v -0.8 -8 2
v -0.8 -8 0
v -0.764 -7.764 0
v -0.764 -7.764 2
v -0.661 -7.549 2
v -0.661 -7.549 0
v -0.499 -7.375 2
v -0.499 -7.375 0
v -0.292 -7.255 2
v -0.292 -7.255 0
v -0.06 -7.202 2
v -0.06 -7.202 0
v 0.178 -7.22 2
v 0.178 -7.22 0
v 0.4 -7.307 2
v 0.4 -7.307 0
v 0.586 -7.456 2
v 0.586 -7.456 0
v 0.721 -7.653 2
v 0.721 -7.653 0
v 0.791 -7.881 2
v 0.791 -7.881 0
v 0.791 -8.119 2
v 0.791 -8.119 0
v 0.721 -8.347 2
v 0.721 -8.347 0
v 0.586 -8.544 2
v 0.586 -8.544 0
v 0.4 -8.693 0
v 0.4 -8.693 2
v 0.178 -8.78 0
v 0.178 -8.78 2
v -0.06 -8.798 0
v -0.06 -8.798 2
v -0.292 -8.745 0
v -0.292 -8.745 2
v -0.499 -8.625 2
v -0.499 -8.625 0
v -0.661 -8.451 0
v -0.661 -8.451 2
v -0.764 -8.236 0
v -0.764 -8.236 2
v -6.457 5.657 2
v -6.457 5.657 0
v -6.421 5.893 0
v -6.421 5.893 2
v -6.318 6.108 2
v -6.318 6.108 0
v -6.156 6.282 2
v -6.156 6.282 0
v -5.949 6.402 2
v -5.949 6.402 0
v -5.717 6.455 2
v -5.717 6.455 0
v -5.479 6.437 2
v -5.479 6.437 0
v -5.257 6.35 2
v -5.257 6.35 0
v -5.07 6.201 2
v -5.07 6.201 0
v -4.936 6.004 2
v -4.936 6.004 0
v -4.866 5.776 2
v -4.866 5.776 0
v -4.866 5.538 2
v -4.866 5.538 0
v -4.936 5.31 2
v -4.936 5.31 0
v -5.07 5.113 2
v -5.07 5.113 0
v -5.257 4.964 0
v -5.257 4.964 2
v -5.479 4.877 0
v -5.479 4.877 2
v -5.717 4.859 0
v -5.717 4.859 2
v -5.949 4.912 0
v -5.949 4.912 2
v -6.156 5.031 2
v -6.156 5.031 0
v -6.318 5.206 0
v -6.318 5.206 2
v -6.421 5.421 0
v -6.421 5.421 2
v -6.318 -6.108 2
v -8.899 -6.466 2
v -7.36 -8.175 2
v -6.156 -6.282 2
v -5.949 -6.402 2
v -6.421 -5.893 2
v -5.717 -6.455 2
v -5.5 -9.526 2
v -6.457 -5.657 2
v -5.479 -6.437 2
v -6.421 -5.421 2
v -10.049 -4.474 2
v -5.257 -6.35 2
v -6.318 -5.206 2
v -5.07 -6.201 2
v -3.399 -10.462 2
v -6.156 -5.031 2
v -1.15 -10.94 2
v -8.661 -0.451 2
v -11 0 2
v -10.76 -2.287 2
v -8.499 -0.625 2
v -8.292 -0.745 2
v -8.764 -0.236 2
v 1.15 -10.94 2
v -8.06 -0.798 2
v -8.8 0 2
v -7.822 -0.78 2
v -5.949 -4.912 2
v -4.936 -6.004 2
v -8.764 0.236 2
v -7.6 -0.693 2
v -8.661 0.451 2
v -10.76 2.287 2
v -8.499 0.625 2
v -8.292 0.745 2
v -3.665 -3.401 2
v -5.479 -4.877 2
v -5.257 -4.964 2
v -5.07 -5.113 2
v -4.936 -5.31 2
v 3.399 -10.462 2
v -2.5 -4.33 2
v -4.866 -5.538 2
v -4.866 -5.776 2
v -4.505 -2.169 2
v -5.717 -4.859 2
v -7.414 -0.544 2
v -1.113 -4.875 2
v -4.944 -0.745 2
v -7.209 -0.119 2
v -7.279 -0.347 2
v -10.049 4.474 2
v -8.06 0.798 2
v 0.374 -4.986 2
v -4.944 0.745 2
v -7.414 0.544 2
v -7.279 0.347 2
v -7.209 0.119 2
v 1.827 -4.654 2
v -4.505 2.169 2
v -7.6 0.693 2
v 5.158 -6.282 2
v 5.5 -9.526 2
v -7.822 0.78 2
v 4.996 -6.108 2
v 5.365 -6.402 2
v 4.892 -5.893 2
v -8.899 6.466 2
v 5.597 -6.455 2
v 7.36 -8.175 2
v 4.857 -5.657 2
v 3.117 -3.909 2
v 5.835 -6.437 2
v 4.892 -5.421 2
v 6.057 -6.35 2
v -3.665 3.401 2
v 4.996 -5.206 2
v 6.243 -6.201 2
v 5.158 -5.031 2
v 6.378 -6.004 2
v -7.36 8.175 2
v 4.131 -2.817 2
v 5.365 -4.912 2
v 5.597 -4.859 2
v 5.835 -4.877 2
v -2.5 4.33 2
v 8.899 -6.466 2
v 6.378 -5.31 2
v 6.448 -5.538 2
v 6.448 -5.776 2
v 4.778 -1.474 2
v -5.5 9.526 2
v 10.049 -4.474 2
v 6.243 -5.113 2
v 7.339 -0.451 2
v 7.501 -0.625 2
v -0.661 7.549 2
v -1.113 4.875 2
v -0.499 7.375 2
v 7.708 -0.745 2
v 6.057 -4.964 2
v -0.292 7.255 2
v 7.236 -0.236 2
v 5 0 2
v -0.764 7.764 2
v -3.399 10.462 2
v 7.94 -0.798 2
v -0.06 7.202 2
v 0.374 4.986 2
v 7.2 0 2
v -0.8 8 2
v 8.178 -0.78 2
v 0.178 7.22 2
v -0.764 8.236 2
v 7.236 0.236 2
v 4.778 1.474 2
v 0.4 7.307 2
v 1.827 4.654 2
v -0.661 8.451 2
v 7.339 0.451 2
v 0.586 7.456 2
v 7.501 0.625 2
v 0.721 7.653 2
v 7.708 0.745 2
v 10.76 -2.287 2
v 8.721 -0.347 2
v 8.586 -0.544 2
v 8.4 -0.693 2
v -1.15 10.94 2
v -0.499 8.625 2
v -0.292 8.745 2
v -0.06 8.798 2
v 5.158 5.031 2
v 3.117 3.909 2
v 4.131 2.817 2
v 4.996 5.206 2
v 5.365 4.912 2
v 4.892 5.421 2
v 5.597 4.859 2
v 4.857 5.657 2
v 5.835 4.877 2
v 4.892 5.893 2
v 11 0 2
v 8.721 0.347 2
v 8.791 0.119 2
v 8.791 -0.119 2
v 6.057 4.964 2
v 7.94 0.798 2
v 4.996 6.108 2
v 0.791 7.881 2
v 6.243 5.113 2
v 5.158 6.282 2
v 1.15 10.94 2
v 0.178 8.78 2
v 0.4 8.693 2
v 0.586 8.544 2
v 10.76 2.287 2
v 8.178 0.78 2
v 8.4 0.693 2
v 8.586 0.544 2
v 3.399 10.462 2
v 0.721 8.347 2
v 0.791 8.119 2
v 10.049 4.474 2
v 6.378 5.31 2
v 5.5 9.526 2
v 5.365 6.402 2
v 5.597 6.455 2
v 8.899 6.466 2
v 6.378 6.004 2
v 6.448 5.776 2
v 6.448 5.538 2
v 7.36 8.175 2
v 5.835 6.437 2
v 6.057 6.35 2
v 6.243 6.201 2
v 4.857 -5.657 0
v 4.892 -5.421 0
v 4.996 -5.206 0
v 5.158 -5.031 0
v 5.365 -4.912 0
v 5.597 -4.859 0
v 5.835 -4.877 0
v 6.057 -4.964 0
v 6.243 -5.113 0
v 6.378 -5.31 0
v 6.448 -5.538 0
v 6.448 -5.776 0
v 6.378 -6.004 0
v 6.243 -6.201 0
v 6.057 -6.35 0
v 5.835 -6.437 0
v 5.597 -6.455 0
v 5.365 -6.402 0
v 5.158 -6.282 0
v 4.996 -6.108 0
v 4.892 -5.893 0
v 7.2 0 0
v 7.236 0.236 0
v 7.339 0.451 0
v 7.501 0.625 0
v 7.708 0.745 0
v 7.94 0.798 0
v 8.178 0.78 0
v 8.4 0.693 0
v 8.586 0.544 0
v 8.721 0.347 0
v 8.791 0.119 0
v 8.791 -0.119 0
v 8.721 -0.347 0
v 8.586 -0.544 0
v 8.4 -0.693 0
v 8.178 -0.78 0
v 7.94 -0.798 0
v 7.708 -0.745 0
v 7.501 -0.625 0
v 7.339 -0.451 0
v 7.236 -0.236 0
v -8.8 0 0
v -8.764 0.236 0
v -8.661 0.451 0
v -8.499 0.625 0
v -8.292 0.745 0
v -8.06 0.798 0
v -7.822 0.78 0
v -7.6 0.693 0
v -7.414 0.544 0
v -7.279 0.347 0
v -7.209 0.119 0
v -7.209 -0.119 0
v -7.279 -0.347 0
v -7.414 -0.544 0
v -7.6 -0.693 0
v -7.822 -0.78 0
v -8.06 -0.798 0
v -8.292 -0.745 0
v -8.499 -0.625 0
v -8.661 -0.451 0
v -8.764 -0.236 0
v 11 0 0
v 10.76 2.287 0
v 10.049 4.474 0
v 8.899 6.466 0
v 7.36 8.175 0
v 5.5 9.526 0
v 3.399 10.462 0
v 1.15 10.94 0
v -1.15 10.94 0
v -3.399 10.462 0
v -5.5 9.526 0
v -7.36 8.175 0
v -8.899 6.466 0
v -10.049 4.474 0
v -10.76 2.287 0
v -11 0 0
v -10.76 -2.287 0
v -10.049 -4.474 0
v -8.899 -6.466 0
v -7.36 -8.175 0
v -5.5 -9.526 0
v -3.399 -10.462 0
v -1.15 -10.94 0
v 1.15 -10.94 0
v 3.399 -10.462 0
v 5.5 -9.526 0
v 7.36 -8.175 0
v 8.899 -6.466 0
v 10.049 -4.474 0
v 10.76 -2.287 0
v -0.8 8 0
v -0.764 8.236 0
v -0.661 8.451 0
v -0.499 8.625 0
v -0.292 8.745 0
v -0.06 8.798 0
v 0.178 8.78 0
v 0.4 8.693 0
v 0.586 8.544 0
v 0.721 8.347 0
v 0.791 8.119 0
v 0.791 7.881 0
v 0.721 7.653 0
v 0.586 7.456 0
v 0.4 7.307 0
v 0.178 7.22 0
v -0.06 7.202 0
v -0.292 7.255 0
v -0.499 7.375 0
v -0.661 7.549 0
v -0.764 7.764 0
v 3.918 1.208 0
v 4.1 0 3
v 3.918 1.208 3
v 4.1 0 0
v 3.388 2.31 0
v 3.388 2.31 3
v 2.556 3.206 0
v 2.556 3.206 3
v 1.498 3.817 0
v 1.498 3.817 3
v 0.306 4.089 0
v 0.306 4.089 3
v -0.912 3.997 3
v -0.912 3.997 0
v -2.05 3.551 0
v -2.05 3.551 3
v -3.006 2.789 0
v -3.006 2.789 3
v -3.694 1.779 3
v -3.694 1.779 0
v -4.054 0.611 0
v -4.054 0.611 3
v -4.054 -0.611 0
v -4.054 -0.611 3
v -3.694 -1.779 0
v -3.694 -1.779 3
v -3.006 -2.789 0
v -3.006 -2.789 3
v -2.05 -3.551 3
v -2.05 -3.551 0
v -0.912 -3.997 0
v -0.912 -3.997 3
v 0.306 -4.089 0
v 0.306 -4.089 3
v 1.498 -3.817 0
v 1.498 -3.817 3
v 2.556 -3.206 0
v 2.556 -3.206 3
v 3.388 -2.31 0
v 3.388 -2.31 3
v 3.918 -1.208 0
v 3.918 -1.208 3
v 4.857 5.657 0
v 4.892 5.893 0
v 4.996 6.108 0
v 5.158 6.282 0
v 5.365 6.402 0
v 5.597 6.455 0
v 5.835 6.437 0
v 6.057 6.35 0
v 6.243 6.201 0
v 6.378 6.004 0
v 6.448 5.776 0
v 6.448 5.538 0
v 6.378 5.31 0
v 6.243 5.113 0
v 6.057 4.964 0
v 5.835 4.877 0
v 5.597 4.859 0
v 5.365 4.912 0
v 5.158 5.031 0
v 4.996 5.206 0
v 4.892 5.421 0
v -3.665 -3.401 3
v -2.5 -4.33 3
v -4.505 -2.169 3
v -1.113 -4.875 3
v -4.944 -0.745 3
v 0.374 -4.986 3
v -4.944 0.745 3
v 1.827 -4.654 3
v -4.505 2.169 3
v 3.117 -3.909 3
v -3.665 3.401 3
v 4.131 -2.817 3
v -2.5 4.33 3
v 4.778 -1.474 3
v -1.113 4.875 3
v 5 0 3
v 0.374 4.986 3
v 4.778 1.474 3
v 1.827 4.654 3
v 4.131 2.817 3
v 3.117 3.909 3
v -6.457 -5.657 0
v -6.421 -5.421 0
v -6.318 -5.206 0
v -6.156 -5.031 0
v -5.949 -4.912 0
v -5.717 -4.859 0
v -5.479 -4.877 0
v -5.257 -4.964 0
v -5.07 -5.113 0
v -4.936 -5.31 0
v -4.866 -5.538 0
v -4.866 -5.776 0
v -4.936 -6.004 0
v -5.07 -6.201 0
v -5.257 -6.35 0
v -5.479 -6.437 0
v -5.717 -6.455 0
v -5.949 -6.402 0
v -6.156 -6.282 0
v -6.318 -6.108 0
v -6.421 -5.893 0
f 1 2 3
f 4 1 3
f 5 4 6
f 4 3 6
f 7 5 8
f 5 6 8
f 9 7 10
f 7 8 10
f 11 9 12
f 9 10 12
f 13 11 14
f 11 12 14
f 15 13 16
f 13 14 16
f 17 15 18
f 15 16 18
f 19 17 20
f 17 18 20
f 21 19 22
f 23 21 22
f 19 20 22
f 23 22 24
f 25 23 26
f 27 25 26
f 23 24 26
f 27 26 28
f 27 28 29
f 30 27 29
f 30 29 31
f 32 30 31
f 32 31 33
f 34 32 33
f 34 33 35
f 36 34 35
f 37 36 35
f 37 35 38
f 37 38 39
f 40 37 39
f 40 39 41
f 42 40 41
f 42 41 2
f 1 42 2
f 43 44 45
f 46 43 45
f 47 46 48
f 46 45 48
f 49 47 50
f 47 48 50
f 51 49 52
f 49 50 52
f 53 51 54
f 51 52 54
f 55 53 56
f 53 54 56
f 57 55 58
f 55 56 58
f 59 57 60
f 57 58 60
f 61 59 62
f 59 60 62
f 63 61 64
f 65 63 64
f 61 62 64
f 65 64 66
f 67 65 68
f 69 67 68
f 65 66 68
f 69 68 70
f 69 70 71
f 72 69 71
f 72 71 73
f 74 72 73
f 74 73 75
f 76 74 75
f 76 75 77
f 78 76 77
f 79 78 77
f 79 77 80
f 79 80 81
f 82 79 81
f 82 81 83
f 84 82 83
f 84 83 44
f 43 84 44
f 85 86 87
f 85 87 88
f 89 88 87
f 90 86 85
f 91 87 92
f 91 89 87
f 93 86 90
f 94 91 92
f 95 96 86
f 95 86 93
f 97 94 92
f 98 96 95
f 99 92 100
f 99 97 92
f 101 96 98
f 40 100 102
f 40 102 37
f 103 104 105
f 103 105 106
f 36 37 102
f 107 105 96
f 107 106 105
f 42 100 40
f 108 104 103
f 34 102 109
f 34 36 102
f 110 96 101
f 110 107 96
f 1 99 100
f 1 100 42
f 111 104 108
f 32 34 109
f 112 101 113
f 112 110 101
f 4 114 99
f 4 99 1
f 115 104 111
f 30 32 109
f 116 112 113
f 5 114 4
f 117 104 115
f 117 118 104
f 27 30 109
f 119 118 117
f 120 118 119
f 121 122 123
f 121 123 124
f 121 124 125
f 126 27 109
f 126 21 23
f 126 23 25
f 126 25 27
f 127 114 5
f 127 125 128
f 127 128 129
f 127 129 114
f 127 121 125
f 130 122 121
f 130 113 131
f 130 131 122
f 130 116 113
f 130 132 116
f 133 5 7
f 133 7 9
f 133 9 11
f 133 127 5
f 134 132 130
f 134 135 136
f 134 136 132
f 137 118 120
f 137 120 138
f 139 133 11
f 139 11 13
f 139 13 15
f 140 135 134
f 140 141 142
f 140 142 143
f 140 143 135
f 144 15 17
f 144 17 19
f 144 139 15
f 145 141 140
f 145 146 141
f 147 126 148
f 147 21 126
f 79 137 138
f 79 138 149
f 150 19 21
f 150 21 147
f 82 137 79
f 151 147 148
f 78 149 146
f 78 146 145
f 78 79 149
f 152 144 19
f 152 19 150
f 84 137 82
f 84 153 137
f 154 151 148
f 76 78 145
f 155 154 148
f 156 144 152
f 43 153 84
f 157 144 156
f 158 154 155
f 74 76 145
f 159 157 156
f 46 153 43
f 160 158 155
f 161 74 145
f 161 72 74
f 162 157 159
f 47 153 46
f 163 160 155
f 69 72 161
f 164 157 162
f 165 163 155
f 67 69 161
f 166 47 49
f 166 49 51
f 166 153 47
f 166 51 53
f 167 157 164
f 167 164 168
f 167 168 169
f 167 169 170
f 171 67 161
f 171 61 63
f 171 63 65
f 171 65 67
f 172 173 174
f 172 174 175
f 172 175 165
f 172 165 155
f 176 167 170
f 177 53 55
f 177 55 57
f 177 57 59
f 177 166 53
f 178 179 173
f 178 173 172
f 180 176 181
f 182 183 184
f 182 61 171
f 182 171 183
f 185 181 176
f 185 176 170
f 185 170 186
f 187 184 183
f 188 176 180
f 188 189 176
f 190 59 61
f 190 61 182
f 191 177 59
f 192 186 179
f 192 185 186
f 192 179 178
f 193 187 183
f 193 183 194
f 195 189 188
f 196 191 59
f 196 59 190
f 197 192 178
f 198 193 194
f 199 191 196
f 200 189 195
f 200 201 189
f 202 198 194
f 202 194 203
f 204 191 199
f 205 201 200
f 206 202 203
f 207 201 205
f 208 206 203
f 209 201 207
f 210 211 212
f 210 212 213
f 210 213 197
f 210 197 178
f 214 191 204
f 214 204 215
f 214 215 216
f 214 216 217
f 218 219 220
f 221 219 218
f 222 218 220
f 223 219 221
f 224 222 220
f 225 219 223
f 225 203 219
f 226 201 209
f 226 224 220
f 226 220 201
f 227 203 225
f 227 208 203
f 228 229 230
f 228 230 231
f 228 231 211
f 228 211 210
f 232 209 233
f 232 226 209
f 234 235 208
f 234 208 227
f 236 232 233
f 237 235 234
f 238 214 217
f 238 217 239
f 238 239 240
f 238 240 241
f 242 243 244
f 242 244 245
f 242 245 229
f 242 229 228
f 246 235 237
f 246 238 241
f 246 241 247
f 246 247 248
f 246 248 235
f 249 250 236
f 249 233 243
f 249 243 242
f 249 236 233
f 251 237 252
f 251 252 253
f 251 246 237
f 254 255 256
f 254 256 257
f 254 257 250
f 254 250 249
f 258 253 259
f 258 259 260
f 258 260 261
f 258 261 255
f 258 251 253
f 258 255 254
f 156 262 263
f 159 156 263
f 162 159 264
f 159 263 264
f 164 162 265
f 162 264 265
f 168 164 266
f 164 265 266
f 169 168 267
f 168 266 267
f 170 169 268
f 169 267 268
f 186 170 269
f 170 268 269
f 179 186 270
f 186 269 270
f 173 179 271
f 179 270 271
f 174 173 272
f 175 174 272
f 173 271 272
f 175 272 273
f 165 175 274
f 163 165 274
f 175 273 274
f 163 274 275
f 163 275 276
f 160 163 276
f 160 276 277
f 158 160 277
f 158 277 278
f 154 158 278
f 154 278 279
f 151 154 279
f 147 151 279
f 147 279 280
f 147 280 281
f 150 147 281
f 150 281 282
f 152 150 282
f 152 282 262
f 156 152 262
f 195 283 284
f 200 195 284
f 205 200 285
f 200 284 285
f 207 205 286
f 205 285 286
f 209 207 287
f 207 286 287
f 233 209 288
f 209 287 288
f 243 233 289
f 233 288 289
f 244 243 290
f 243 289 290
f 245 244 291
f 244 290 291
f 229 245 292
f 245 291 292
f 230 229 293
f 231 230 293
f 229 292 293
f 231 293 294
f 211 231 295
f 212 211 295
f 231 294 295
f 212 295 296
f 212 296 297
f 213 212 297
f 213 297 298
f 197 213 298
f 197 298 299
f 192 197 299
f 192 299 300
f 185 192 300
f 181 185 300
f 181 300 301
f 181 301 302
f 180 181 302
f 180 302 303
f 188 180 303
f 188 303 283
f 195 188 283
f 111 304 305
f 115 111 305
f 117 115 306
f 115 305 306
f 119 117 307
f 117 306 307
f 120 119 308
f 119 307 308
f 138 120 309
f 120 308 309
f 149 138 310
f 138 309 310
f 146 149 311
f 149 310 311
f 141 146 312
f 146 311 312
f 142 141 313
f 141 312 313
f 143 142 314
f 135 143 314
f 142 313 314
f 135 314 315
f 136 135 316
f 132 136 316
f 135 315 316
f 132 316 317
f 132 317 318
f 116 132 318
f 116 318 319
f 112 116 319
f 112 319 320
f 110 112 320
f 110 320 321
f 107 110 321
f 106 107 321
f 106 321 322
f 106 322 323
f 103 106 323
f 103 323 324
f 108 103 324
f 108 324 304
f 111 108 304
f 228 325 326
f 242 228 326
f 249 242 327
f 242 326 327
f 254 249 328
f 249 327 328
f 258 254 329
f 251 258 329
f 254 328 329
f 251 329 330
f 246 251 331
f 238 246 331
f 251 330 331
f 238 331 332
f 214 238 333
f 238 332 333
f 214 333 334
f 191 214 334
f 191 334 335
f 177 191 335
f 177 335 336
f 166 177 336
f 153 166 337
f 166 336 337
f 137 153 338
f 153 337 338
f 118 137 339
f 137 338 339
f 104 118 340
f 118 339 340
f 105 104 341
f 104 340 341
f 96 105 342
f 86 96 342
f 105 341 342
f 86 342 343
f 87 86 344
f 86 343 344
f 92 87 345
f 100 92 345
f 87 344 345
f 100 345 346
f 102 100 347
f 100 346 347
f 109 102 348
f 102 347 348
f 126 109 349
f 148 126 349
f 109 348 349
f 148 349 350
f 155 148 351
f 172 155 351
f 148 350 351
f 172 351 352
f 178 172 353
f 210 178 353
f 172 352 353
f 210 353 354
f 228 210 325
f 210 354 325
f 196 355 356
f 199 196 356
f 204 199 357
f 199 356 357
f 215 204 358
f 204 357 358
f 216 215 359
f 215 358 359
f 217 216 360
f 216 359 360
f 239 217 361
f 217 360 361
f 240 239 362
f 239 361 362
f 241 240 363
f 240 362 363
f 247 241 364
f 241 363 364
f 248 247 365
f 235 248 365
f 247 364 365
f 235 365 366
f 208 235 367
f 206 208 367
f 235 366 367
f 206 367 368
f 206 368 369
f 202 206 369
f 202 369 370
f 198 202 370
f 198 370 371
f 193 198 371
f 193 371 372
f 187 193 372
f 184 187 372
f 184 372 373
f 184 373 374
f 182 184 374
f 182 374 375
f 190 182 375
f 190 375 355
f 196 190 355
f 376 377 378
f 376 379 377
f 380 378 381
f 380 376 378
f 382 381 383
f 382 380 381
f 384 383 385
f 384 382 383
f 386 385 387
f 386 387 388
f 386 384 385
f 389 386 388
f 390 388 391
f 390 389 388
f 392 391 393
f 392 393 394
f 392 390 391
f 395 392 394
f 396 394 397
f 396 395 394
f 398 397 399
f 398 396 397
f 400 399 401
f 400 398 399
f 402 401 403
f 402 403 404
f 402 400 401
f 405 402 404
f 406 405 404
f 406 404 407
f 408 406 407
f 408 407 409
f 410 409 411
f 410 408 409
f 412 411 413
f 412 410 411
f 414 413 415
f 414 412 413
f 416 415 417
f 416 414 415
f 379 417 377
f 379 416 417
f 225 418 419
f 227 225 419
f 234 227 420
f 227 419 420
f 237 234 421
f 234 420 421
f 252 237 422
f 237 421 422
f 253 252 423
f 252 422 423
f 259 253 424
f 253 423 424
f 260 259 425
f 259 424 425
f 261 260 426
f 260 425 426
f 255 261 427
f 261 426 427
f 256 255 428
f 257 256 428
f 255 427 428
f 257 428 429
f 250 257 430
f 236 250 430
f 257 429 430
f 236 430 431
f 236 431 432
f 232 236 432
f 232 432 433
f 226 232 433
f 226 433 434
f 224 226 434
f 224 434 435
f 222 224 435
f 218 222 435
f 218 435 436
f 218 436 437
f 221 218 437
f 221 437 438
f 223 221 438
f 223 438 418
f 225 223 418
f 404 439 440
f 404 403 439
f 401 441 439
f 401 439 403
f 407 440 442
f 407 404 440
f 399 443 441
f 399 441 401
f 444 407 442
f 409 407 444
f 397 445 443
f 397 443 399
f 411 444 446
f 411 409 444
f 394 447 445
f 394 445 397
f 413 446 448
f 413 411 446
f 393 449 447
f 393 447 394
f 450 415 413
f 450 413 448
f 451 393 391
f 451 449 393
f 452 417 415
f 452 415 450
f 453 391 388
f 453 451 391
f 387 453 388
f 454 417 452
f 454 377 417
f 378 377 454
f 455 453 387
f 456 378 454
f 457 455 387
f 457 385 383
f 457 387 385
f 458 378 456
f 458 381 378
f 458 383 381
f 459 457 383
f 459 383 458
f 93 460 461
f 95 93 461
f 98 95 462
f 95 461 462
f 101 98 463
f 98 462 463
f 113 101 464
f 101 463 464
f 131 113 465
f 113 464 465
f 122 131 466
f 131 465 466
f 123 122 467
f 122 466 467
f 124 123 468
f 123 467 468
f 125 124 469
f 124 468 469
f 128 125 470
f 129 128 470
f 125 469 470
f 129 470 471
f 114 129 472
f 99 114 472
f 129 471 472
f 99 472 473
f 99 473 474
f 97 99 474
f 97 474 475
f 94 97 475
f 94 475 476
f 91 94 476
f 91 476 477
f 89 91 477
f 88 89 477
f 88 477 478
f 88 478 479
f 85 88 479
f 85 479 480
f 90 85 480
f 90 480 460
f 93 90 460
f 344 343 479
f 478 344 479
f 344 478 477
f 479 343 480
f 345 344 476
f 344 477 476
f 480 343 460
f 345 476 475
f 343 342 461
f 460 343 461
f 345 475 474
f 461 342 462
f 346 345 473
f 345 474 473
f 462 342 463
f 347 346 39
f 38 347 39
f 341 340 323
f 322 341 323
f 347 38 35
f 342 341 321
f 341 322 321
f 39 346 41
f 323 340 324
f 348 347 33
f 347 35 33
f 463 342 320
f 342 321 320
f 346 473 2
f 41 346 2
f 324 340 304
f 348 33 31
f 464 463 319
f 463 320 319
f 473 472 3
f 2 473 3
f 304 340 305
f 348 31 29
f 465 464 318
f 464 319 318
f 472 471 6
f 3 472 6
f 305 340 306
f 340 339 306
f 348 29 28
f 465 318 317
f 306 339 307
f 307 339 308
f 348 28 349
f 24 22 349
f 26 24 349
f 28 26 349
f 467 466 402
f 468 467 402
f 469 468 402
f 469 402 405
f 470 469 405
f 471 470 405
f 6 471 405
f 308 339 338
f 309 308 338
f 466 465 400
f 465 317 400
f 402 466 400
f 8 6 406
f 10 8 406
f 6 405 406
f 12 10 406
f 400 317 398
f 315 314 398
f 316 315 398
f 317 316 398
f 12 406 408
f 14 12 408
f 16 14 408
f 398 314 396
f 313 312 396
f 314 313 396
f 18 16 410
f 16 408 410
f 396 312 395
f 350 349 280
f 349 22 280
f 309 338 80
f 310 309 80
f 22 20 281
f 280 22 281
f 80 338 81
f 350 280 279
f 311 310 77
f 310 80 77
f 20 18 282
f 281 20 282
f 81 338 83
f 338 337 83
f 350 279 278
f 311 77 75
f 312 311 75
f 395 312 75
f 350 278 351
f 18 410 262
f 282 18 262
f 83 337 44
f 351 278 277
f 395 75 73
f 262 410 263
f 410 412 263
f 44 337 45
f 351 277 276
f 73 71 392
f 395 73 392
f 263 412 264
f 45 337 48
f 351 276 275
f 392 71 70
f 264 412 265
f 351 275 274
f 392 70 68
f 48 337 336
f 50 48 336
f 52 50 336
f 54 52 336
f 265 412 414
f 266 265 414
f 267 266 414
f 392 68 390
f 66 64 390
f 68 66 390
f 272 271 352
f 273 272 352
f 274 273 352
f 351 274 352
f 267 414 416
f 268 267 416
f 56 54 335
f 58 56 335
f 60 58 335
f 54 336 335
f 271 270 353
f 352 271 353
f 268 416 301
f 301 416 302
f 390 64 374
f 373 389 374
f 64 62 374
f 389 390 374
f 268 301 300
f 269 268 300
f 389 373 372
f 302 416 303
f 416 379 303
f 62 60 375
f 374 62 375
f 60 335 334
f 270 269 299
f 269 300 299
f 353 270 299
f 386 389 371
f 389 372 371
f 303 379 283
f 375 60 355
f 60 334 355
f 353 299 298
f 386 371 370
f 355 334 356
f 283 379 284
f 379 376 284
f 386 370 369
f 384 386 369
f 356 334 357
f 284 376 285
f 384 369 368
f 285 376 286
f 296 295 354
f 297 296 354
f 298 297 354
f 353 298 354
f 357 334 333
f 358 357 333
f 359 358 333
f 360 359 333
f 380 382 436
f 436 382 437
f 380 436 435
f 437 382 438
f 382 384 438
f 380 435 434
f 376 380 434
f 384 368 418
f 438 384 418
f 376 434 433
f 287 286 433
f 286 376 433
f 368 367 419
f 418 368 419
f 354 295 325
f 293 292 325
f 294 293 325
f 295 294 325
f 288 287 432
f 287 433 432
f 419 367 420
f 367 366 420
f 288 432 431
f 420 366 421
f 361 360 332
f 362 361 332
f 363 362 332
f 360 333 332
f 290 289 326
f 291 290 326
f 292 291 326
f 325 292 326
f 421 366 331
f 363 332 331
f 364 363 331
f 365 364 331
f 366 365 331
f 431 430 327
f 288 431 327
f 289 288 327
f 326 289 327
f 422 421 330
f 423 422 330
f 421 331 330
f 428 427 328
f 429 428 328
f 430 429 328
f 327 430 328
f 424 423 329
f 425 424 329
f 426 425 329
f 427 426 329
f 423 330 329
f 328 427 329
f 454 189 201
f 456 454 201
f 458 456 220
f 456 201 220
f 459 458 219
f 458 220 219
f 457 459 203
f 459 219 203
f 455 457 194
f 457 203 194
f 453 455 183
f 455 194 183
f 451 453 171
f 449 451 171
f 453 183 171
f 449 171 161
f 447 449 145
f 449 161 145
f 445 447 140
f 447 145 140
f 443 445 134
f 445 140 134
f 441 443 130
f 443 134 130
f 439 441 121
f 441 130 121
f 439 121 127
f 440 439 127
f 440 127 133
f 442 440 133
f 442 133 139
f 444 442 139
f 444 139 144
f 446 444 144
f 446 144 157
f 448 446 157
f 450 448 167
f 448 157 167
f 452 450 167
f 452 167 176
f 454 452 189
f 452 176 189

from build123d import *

# Parameters (mm, degrees)
SKETCH1_R                 = 11
SKETCH1_R_2               = 4.1
BOSS_EXTRUDE1_DEPTH       = 2
M2X0_4_TAPPED_HOLE1_D     = 1.6
M2X0_4_TAPPED_HOLE1_DEPTH = 5.2
M2X0_4_TAPPED_HOLE1_TIP   = 0.480688495
SKETCH5_R                 = 5
SKETCH5_R_2               = 4.1
BOSS_EXTRUDE2_DEPTH       = 1


with BuildPart() as part:
    # Sketch1 → Boss-Extrude1 (new body)
    with BuildSketch(Plane.XY):
        Circle(SKETCH1_R)
        Circle(SKETCH1_R_2, mode=Mode.SUBTRACT)
    extrude(amount=BOSS_EXTRUDE1_DEPTH)

    # M2x0.4 Tapped Hole1
    with Locations(Plane.XY.offset(2)):
        with Locations((0, 8), (5.656854249, 5.656854249), (8, 0), (5.656854249, -5.656854249), (0, -8), (-5.656854249, -5.656854249), (-8, 0), (-5.656854249, 5.656854249)):
            Hole(M2X0_4_TAPPED_HOLE1_D / 2, depth=M2X0_4_TAPPED_HOLE1_DEPTH)
            with Locations((0, 0, -(M2X0_4_TAPPED_HOLE1_DEPTH + M2X0_4_TAPPED_HOLE1_TIP / 2))):  # 118° drill point
                Cone(0, M2X0_4_TAPPED_HOLE1_D / 2, M2X0_4_TAPPED_HOLE1_TIP, mode=Mode.SUBTRACT)

    # Sketch5 → Boss-Extrude2 (add)
    with BuildSketch(Plane.XY.offset(2)):
        Circle(SKETCH5_R)
        Circle(SKETCH5_R_2, mode=Mode.SUBTRACT)
    extrude(amount=BOSS_EXTRUDE2_DEPTH)


solid = part.part
